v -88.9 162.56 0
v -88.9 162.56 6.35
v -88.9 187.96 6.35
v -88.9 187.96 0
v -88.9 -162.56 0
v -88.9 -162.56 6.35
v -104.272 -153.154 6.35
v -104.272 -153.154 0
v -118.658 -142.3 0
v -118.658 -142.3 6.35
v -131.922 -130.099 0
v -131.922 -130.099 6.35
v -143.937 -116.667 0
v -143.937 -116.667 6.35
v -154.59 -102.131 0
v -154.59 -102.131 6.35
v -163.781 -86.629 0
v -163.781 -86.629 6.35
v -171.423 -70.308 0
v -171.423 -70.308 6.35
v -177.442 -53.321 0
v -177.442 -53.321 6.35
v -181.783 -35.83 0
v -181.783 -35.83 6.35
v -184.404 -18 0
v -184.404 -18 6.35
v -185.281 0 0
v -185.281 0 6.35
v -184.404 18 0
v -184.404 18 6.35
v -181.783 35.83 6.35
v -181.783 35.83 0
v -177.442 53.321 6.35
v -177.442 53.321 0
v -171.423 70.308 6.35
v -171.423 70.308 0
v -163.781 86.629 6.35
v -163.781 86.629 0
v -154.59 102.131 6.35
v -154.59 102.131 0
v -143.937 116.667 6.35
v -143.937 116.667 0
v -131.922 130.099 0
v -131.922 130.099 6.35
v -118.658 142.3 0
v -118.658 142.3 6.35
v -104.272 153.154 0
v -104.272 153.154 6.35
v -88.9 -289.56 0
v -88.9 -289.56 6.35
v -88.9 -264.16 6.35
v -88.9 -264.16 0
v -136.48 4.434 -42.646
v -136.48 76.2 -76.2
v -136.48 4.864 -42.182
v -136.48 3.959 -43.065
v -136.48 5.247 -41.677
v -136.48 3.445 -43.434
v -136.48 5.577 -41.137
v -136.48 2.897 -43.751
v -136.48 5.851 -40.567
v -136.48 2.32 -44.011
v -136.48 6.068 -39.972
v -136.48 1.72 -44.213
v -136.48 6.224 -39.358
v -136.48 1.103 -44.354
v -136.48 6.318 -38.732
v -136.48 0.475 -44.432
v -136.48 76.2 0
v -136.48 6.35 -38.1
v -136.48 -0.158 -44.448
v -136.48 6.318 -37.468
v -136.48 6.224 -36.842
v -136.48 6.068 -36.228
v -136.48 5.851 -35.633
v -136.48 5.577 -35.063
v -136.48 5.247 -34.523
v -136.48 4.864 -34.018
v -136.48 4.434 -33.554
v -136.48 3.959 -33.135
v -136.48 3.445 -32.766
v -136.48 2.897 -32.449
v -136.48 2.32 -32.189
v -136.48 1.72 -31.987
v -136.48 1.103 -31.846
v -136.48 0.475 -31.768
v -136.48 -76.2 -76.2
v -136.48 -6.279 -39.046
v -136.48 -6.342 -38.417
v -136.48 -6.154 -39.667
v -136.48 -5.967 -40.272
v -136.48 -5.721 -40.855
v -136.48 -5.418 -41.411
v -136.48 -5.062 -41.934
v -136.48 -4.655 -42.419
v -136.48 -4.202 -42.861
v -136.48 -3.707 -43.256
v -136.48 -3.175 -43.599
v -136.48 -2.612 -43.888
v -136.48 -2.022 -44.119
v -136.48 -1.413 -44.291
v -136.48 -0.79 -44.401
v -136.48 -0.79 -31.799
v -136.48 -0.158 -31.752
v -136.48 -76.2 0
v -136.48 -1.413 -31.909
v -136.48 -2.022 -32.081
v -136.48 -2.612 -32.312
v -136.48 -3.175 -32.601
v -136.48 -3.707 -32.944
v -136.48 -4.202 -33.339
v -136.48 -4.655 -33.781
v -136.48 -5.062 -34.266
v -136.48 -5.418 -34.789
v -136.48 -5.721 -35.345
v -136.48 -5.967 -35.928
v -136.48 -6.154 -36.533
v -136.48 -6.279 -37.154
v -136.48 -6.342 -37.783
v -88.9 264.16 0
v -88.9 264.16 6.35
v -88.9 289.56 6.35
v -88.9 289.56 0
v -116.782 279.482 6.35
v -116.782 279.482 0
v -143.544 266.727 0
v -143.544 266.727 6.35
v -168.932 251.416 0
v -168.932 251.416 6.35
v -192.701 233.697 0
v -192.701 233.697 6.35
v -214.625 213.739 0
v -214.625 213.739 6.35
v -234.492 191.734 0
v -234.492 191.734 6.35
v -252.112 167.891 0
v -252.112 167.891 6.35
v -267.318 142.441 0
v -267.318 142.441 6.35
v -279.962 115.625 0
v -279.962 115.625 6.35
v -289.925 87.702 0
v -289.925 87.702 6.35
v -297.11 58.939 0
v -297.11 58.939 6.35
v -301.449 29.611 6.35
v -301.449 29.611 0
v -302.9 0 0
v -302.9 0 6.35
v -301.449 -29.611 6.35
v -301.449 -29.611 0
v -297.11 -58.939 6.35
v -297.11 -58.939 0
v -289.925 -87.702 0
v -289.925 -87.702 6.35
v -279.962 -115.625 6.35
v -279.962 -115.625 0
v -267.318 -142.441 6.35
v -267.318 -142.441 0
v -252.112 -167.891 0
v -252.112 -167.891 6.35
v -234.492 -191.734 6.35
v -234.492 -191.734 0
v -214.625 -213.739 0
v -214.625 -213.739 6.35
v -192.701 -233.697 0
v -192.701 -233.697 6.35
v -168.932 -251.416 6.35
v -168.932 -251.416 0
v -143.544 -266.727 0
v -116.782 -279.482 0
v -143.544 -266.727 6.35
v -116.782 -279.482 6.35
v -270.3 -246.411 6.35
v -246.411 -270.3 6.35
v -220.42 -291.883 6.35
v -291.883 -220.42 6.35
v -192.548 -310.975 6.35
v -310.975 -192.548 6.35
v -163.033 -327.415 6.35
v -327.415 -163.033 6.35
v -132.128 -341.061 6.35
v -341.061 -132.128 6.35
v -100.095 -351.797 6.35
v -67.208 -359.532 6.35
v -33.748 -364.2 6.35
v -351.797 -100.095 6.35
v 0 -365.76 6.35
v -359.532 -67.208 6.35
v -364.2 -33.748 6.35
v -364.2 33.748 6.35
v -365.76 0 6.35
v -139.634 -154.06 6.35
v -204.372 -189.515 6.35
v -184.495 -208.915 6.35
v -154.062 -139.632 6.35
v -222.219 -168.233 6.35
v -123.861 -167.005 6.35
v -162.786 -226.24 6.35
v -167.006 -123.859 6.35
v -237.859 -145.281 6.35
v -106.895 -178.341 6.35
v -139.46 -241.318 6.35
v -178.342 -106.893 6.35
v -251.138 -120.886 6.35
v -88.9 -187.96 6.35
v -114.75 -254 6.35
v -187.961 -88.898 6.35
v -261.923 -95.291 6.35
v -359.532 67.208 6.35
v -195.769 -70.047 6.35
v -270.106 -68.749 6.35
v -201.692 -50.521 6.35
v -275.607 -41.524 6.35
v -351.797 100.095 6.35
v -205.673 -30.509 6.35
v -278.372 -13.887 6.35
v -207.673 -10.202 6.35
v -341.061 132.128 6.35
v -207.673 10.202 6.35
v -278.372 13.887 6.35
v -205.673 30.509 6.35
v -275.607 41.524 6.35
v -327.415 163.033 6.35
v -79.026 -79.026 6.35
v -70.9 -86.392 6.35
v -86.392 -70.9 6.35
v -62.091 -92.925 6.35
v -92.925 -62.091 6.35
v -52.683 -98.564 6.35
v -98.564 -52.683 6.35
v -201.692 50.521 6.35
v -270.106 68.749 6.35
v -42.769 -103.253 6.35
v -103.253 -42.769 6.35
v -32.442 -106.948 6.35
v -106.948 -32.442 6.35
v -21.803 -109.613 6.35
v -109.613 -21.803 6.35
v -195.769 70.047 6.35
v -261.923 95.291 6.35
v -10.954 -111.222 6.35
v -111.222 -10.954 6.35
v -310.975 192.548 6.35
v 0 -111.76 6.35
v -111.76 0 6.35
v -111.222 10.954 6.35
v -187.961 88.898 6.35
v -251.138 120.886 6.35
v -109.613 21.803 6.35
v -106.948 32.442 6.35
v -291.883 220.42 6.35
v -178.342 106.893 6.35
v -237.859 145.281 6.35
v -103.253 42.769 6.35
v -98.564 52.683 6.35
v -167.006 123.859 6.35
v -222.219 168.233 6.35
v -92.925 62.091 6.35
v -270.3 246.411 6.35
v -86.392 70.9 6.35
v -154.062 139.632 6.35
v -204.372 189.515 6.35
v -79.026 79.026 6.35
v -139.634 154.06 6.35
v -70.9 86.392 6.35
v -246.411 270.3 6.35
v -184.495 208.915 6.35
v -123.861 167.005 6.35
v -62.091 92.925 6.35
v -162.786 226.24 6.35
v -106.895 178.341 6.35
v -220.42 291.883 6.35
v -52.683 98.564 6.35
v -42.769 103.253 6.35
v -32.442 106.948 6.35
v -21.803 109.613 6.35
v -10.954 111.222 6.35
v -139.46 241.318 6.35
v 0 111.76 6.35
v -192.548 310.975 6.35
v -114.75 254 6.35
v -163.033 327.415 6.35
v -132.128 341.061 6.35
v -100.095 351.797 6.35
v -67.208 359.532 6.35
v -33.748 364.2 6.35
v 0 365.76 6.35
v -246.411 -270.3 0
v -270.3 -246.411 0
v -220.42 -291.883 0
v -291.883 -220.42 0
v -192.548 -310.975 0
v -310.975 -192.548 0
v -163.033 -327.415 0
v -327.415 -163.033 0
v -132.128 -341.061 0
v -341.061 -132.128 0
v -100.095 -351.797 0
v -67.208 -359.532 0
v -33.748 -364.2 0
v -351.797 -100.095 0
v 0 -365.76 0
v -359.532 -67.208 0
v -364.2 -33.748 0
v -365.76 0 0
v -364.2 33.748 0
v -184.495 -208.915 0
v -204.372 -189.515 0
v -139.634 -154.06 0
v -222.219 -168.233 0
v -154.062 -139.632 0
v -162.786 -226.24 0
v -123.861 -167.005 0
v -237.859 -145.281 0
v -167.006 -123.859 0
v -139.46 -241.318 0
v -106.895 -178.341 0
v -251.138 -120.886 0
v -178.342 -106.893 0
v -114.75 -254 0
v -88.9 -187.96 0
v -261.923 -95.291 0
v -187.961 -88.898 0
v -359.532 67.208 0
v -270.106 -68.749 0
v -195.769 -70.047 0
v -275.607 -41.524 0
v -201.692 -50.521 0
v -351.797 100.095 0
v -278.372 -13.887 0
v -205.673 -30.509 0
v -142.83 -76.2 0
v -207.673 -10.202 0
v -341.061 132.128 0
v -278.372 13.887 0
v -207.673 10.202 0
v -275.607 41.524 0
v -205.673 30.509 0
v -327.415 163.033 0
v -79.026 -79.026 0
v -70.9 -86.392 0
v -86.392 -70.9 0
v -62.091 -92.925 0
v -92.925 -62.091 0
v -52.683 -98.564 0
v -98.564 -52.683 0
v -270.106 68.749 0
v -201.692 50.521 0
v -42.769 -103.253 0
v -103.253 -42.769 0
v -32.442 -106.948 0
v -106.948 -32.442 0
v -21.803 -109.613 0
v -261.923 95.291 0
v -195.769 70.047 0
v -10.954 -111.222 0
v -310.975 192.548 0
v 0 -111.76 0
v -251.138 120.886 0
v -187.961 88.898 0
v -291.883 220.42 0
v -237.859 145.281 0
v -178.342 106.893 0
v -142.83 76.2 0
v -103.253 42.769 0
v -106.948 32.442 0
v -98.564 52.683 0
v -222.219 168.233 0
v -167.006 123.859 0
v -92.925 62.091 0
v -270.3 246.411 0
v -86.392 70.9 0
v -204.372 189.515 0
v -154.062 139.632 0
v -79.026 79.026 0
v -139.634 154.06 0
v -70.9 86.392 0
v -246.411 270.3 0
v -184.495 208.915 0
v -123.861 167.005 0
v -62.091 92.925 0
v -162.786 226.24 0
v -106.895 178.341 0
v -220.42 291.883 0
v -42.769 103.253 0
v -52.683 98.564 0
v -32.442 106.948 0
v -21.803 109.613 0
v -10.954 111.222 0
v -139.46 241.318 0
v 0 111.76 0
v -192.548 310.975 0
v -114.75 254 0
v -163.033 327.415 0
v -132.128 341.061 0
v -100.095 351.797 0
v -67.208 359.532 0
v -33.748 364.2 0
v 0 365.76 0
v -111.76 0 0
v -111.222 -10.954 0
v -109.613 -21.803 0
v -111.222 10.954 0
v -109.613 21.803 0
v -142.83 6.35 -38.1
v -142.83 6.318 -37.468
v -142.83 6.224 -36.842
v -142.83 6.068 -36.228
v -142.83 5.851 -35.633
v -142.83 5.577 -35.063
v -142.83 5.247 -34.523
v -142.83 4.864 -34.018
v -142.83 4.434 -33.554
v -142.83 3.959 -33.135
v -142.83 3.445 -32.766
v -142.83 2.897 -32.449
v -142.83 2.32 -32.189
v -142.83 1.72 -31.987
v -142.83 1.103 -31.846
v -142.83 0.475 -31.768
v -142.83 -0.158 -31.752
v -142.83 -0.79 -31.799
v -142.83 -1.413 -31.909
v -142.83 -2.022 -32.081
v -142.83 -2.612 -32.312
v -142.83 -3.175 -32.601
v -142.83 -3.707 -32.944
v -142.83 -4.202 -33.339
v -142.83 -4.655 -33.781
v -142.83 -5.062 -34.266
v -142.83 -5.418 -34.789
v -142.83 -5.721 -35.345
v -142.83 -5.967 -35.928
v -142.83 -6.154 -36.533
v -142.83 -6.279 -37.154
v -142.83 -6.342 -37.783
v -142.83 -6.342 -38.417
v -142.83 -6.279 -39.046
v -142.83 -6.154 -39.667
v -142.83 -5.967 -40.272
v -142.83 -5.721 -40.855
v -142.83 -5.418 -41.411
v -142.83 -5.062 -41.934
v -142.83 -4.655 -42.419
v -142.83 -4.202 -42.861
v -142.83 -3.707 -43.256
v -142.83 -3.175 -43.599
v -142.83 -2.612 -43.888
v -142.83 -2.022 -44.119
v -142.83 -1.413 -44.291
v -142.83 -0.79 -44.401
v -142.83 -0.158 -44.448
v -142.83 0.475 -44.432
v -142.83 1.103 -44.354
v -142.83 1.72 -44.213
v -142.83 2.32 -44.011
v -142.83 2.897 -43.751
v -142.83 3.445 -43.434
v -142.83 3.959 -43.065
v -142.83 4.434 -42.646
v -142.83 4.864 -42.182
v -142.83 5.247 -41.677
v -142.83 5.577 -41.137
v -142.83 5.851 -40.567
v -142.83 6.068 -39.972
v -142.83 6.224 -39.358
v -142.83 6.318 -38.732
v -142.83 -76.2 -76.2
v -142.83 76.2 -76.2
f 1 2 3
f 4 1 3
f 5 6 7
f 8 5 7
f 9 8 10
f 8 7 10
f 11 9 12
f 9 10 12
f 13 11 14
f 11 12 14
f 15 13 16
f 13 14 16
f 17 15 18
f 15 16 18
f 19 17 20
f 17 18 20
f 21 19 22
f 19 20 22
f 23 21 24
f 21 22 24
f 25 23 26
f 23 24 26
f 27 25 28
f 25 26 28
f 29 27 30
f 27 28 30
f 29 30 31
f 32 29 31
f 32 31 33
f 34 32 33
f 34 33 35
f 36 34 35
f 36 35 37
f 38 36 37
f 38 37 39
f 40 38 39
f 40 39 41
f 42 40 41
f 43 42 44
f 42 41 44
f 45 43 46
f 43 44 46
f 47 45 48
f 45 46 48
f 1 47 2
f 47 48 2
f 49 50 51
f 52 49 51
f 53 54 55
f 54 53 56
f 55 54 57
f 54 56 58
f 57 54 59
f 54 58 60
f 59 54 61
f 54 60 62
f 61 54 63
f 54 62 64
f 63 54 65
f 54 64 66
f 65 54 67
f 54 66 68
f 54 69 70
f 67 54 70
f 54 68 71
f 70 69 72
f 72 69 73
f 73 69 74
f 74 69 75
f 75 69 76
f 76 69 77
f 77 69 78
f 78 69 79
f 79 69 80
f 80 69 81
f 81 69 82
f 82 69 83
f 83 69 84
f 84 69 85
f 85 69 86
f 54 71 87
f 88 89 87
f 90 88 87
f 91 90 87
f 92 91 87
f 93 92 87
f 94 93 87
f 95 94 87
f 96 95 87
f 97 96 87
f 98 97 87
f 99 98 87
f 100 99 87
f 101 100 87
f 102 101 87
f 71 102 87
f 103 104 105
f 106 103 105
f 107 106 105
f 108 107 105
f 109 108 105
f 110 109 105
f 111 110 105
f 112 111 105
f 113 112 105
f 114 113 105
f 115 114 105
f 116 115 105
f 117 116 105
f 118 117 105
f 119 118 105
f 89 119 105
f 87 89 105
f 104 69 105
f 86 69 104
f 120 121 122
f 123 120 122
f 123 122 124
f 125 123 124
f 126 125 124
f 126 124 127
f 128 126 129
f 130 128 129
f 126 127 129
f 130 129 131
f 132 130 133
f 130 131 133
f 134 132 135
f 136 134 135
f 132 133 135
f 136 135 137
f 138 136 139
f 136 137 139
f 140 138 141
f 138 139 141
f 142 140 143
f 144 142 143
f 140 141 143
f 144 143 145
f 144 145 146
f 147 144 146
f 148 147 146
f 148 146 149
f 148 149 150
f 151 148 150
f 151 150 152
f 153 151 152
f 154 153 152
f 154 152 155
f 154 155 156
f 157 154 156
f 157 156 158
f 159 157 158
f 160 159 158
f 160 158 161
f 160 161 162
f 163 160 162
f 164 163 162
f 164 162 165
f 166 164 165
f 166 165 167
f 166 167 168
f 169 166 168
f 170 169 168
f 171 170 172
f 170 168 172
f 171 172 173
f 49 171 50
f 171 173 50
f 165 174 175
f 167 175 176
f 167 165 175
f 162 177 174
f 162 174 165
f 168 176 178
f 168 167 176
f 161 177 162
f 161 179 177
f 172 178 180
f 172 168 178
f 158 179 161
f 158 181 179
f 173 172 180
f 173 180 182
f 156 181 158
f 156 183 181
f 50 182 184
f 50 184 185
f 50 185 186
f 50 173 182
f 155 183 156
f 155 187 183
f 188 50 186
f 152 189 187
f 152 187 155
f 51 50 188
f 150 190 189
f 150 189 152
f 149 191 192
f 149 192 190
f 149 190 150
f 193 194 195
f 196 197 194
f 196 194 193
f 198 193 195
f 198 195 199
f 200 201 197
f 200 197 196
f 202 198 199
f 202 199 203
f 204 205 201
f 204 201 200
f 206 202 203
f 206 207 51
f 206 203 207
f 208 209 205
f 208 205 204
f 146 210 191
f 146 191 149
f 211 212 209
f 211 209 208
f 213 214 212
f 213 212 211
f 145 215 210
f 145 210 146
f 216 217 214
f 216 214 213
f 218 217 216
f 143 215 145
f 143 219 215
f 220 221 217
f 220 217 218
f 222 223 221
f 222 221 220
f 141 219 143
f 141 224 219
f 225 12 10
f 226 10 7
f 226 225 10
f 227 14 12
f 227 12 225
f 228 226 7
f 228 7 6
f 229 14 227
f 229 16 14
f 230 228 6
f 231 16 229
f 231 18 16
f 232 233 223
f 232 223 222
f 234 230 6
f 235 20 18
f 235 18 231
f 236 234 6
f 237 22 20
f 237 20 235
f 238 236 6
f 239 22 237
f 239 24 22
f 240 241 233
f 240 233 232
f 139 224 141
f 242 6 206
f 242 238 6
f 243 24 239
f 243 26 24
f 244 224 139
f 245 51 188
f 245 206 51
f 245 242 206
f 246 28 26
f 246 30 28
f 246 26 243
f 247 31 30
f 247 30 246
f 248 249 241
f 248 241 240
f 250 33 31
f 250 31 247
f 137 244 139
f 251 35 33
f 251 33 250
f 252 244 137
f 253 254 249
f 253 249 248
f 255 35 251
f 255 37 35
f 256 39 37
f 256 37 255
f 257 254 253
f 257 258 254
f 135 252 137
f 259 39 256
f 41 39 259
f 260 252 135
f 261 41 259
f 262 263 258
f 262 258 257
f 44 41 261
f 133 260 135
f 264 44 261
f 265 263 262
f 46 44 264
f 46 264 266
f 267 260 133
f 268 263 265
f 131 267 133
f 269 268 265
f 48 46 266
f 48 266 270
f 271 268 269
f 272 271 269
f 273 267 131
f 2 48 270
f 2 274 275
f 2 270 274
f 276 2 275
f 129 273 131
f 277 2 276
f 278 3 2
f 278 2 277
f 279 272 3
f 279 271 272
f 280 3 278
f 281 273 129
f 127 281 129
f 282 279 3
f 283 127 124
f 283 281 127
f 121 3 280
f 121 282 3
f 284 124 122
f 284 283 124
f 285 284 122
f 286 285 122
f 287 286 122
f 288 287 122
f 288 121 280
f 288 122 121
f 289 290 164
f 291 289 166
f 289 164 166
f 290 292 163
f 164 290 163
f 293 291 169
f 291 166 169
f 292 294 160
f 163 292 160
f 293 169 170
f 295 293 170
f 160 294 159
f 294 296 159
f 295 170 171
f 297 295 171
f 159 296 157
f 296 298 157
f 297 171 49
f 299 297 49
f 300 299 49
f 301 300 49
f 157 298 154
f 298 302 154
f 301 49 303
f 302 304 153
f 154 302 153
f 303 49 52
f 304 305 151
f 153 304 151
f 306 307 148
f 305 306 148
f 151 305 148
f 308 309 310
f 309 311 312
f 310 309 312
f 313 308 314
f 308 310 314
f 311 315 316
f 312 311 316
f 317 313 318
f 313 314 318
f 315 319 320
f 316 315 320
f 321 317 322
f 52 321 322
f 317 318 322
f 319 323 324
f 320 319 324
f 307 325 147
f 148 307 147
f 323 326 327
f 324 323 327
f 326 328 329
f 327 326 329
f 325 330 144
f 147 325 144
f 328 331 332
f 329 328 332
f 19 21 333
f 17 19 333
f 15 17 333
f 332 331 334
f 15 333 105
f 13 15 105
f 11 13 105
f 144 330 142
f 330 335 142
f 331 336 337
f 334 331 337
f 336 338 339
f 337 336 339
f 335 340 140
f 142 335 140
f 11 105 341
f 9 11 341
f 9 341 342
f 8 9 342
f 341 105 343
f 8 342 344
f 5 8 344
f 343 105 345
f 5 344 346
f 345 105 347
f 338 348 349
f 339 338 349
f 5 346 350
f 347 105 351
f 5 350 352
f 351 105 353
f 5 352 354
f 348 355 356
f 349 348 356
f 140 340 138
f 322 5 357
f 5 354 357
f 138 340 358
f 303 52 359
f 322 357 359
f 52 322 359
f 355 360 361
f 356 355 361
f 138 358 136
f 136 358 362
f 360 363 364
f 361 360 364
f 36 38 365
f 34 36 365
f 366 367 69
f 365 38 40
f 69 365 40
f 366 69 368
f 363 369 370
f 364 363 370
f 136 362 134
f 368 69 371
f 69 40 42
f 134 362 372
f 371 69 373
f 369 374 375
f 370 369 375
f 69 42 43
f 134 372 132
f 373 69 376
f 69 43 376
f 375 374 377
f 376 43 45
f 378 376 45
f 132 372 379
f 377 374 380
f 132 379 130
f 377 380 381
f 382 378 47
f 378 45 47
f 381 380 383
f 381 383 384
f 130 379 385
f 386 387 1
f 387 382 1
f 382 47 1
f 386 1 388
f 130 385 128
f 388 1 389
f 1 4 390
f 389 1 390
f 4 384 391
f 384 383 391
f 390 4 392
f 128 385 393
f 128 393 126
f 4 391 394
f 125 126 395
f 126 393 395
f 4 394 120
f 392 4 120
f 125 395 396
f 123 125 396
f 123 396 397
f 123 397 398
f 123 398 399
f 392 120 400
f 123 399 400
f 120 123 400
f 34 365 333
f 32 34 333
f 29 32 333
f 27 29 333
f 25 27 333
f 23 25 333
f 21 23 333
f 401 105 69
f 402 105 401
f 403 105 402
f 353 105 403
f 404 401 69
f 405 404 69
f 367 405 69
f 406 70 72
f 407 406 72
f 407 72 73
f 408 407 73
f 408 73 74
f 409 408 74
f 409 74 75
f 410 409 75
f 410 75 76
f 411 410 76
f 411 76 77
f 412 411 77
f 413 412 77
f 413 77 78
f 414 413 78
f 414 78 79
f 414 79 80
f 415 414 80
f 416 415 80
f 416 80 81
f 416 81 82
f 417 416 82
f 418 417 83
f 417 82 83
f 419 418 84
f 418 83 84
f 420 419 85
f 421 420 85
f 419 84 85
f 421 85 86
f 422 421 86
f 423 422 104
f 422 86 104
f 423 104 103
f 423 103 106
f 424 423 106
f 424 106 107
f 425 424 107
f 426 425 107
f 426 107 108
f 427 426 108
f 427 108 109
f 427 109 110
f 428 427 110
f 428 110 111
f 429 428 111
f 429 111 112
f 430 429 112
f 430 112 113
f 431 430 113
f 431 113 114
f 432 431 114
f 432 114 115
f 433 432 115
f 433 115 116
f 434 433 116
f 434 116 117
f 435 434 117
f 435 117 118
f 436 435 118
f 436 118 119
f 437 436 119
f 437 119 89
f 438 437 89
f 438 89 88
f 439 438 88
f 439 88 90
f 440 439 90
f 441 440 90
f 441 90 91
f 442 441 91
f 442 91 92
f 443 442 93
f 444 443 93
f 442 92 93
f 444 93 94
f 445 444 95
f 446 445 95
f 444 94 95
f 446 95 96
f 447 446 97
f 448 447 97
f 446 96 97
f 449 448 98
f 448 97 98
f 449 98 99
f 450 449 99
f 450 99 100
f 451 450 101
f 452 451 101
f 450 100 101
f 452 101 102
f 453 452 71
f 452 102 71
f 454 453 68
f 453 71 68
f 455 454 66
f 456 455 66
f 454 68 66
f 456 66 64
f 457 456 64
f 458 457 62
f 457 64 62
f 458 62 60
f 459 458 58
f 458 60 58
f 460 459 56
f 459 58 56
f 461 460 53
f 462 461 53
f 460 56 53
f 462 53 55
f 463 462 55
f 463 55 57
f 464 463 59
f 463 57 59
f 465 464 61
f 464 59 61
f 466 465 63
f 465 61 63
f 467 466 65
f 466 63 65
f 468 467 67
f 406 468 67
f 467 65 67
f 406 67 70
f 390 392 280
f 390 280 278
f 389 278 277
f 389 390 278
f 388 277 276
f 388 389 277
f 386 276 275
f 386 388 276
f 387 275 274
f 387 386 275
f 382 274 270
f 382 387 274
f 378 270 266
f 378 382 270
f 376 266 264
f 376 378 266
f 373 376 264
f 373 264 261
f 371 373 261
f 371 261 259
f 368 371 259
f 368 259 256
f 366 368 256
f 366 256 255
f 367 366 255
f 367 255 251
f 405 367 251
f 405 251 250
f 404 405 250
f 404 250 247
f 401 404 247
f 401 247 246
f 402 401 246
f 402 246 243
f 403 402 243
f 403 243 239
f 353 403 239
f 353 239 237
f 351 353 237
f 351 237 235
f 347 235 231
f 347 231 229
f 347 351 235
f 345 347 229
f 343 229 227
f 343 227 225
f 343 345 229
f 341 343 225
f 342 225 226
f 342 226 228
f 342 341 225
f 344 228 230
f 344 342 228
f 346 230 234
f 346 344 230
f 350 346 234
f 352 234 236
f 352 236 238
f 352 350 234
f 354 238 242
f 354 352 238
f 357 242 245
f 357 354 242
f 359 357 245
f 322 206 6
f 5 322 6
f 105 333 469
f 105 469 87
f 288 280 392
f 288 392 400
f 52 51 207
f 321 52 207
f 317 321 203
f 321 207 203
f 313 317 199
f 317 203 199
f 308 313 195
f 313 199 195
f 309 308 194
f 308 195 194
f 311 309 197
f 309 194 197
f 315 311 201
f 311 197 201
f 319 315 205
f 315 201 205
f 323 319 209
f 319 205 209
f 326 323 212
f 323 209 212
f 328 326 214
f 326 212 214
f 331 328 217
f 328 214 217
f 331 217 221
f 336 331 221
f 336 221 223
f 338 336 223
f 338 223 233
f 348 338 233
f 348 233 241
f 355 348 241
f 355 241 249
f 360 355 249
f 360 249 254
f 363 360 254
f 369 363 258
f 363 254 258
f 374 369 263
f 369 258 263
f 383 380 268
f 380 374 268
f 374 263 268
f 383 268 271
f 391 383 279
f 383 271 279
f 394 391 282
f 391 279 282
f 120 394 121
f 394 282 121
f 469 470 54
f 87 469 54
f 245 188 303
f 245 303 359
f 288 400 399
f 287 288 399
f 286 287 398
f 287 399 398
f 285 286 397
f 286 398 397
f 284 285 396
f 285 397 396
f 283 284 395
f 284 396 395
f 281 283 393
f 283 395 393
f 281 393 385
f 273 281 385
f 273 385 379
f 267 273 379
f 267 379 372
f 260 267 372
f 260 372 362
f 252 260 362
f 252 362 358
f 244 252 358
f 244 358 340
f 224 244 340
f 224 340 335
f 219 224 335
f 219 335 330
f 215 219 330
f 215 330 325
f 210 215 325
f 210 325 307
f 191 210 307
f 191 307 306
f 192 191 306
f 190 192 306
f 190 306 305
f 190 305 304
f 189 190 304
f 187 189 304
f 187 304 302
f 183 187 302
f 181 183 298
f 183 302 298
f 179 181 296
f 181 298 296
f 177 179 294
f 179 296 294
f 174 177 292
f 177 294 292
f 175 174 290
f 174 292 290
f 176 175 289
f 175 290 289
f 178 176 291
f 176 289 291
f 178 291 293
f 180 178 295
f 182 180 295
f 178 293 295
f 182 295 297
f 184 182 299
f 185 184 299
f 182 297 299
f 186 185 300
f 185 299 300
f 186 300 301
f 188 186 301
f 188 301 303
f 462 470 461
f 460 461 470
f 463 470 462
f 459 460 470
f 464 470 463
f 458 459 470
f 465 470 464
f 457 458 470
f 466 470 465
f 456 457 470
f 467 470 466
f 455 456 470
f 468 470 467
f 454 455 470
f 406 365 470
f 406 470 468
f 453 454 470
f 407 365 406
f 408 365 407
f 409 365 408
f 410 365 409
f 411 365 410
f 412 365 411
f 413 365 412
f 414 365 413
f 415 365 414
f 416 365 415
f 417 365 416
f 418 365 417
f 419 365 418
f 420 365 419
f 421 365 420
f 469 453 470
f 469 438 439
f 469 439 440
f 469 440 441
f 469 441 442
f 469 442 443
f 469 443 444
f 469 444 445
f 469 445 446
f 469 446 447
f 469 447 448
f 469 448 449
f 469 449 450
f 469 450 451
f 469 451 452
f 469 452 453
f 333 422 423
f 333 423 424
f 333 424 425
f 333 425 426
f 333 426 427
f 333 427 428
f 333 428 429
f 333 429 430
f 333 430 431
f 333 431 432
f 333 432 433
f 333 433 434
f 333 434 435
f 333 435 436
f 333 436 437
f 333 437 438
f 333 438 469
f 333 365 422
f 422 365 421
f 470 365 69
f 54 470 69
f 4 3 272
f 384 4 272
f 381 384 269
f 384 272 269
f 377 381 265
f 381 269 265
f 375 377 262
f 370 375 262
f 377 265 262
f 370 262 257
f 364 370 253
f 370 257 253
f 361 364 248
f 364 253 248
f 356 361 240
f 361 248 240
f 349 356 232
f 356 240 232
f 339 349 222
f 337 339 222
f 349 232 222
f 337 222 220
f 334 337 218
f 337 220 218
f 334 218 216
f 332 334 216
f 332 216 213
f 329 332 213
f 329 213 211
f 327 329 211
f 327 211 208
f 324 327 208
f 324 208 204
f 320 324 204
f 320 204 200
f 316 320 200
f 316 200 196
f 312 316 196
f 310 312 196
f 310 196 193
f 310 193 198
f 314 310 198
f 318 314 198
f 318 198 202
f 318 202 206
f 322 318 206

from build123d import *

# Parameters (mm, degrees)
F0_R     = 365.76
F0_R_2   = 111.76
F1_DEPTH = 6.35
F2_W     = 380.011261
F2_H     = 787.612766
F3_DEPTH = 6.351
F5_DEPTH = 6.351
F6_W     = 6.35
F6_H     = 152.4
F7_DEPTH = 76.2
F8_R     = 6.35
F9_DEPTH = 229.281121


with BuildPart() as f1:
    # F0 (on Top) → F1 (new body)
    with BuildSketch(Plane.XY):
        Circle(F0_R)
        Circle(F0_R_2, mode=Mode.SUBTRACT)
    extrude(amount=F1_DEPTH)

    # F2 (on face) → F3 (cut, through all)
    with BuildSketch(Plane.XY.offset(6.35)):
        with Locations((190.00563, 1.120374)):
            Rectangle(F2_W, F2_H)
    extrude(amount=-F3_DEPTH, mode=Mode.SUBTRACT)

    # F4 (on face) → F5 (cut, through all)
    with BuildSketch(Plane.XY.offset(6.35)):
        with BuildLine():
            ThreePointArc((-88.9, 289.56), (-302.899659, 0), (-88.9, -289.56))
            Line((-88.9, -289.56), (-88.9, -264.16))
            ThreePointArc((-88.9, -264.16), (-278.717986, 0), (-88.9, 264.16))
            Line((-88.9, 264.16), (-88.9, 289.56))
        make_face()
        with BuildLine():
            ThreePointArc((-88.9, 187.96), (-207.923475, 0), (-88.9, -187.96))
            Line((-88.9, -187.96), (-88.9, -162.56))
            ThreePointArc((-88.9, -162.56), (-185.28077, 0), (-88.9, 162.56))
            Line((-88.9, 162.56), (-88.9, 187.96))
        make_face()
    extrude(amount=-F5_DEPTH, mode=Mode.SUBTRACT)

    # F6 (on face) → F7 (join)
    with BuildSketch(Plane(origin=(0, 0, 0), x_dir=(1, 0, 0), z_dir=(0, 0, -1))):
        with Locations((-139.654879, 0)):
            Rectangle(F6_W, F6_H)
    extrude(amount=F7_DEPTH)

    # F8 (on face) → F9 (cut, through all)
    with BuildSketch(Plane.YZ.offset(-136.479879)):
        with Locations((0, -38.1)):
            Circle(F8_R)
    extrude(amount=-F9_DEPTH, mode=Mode.SUBTRACT)


solid = f1.part
